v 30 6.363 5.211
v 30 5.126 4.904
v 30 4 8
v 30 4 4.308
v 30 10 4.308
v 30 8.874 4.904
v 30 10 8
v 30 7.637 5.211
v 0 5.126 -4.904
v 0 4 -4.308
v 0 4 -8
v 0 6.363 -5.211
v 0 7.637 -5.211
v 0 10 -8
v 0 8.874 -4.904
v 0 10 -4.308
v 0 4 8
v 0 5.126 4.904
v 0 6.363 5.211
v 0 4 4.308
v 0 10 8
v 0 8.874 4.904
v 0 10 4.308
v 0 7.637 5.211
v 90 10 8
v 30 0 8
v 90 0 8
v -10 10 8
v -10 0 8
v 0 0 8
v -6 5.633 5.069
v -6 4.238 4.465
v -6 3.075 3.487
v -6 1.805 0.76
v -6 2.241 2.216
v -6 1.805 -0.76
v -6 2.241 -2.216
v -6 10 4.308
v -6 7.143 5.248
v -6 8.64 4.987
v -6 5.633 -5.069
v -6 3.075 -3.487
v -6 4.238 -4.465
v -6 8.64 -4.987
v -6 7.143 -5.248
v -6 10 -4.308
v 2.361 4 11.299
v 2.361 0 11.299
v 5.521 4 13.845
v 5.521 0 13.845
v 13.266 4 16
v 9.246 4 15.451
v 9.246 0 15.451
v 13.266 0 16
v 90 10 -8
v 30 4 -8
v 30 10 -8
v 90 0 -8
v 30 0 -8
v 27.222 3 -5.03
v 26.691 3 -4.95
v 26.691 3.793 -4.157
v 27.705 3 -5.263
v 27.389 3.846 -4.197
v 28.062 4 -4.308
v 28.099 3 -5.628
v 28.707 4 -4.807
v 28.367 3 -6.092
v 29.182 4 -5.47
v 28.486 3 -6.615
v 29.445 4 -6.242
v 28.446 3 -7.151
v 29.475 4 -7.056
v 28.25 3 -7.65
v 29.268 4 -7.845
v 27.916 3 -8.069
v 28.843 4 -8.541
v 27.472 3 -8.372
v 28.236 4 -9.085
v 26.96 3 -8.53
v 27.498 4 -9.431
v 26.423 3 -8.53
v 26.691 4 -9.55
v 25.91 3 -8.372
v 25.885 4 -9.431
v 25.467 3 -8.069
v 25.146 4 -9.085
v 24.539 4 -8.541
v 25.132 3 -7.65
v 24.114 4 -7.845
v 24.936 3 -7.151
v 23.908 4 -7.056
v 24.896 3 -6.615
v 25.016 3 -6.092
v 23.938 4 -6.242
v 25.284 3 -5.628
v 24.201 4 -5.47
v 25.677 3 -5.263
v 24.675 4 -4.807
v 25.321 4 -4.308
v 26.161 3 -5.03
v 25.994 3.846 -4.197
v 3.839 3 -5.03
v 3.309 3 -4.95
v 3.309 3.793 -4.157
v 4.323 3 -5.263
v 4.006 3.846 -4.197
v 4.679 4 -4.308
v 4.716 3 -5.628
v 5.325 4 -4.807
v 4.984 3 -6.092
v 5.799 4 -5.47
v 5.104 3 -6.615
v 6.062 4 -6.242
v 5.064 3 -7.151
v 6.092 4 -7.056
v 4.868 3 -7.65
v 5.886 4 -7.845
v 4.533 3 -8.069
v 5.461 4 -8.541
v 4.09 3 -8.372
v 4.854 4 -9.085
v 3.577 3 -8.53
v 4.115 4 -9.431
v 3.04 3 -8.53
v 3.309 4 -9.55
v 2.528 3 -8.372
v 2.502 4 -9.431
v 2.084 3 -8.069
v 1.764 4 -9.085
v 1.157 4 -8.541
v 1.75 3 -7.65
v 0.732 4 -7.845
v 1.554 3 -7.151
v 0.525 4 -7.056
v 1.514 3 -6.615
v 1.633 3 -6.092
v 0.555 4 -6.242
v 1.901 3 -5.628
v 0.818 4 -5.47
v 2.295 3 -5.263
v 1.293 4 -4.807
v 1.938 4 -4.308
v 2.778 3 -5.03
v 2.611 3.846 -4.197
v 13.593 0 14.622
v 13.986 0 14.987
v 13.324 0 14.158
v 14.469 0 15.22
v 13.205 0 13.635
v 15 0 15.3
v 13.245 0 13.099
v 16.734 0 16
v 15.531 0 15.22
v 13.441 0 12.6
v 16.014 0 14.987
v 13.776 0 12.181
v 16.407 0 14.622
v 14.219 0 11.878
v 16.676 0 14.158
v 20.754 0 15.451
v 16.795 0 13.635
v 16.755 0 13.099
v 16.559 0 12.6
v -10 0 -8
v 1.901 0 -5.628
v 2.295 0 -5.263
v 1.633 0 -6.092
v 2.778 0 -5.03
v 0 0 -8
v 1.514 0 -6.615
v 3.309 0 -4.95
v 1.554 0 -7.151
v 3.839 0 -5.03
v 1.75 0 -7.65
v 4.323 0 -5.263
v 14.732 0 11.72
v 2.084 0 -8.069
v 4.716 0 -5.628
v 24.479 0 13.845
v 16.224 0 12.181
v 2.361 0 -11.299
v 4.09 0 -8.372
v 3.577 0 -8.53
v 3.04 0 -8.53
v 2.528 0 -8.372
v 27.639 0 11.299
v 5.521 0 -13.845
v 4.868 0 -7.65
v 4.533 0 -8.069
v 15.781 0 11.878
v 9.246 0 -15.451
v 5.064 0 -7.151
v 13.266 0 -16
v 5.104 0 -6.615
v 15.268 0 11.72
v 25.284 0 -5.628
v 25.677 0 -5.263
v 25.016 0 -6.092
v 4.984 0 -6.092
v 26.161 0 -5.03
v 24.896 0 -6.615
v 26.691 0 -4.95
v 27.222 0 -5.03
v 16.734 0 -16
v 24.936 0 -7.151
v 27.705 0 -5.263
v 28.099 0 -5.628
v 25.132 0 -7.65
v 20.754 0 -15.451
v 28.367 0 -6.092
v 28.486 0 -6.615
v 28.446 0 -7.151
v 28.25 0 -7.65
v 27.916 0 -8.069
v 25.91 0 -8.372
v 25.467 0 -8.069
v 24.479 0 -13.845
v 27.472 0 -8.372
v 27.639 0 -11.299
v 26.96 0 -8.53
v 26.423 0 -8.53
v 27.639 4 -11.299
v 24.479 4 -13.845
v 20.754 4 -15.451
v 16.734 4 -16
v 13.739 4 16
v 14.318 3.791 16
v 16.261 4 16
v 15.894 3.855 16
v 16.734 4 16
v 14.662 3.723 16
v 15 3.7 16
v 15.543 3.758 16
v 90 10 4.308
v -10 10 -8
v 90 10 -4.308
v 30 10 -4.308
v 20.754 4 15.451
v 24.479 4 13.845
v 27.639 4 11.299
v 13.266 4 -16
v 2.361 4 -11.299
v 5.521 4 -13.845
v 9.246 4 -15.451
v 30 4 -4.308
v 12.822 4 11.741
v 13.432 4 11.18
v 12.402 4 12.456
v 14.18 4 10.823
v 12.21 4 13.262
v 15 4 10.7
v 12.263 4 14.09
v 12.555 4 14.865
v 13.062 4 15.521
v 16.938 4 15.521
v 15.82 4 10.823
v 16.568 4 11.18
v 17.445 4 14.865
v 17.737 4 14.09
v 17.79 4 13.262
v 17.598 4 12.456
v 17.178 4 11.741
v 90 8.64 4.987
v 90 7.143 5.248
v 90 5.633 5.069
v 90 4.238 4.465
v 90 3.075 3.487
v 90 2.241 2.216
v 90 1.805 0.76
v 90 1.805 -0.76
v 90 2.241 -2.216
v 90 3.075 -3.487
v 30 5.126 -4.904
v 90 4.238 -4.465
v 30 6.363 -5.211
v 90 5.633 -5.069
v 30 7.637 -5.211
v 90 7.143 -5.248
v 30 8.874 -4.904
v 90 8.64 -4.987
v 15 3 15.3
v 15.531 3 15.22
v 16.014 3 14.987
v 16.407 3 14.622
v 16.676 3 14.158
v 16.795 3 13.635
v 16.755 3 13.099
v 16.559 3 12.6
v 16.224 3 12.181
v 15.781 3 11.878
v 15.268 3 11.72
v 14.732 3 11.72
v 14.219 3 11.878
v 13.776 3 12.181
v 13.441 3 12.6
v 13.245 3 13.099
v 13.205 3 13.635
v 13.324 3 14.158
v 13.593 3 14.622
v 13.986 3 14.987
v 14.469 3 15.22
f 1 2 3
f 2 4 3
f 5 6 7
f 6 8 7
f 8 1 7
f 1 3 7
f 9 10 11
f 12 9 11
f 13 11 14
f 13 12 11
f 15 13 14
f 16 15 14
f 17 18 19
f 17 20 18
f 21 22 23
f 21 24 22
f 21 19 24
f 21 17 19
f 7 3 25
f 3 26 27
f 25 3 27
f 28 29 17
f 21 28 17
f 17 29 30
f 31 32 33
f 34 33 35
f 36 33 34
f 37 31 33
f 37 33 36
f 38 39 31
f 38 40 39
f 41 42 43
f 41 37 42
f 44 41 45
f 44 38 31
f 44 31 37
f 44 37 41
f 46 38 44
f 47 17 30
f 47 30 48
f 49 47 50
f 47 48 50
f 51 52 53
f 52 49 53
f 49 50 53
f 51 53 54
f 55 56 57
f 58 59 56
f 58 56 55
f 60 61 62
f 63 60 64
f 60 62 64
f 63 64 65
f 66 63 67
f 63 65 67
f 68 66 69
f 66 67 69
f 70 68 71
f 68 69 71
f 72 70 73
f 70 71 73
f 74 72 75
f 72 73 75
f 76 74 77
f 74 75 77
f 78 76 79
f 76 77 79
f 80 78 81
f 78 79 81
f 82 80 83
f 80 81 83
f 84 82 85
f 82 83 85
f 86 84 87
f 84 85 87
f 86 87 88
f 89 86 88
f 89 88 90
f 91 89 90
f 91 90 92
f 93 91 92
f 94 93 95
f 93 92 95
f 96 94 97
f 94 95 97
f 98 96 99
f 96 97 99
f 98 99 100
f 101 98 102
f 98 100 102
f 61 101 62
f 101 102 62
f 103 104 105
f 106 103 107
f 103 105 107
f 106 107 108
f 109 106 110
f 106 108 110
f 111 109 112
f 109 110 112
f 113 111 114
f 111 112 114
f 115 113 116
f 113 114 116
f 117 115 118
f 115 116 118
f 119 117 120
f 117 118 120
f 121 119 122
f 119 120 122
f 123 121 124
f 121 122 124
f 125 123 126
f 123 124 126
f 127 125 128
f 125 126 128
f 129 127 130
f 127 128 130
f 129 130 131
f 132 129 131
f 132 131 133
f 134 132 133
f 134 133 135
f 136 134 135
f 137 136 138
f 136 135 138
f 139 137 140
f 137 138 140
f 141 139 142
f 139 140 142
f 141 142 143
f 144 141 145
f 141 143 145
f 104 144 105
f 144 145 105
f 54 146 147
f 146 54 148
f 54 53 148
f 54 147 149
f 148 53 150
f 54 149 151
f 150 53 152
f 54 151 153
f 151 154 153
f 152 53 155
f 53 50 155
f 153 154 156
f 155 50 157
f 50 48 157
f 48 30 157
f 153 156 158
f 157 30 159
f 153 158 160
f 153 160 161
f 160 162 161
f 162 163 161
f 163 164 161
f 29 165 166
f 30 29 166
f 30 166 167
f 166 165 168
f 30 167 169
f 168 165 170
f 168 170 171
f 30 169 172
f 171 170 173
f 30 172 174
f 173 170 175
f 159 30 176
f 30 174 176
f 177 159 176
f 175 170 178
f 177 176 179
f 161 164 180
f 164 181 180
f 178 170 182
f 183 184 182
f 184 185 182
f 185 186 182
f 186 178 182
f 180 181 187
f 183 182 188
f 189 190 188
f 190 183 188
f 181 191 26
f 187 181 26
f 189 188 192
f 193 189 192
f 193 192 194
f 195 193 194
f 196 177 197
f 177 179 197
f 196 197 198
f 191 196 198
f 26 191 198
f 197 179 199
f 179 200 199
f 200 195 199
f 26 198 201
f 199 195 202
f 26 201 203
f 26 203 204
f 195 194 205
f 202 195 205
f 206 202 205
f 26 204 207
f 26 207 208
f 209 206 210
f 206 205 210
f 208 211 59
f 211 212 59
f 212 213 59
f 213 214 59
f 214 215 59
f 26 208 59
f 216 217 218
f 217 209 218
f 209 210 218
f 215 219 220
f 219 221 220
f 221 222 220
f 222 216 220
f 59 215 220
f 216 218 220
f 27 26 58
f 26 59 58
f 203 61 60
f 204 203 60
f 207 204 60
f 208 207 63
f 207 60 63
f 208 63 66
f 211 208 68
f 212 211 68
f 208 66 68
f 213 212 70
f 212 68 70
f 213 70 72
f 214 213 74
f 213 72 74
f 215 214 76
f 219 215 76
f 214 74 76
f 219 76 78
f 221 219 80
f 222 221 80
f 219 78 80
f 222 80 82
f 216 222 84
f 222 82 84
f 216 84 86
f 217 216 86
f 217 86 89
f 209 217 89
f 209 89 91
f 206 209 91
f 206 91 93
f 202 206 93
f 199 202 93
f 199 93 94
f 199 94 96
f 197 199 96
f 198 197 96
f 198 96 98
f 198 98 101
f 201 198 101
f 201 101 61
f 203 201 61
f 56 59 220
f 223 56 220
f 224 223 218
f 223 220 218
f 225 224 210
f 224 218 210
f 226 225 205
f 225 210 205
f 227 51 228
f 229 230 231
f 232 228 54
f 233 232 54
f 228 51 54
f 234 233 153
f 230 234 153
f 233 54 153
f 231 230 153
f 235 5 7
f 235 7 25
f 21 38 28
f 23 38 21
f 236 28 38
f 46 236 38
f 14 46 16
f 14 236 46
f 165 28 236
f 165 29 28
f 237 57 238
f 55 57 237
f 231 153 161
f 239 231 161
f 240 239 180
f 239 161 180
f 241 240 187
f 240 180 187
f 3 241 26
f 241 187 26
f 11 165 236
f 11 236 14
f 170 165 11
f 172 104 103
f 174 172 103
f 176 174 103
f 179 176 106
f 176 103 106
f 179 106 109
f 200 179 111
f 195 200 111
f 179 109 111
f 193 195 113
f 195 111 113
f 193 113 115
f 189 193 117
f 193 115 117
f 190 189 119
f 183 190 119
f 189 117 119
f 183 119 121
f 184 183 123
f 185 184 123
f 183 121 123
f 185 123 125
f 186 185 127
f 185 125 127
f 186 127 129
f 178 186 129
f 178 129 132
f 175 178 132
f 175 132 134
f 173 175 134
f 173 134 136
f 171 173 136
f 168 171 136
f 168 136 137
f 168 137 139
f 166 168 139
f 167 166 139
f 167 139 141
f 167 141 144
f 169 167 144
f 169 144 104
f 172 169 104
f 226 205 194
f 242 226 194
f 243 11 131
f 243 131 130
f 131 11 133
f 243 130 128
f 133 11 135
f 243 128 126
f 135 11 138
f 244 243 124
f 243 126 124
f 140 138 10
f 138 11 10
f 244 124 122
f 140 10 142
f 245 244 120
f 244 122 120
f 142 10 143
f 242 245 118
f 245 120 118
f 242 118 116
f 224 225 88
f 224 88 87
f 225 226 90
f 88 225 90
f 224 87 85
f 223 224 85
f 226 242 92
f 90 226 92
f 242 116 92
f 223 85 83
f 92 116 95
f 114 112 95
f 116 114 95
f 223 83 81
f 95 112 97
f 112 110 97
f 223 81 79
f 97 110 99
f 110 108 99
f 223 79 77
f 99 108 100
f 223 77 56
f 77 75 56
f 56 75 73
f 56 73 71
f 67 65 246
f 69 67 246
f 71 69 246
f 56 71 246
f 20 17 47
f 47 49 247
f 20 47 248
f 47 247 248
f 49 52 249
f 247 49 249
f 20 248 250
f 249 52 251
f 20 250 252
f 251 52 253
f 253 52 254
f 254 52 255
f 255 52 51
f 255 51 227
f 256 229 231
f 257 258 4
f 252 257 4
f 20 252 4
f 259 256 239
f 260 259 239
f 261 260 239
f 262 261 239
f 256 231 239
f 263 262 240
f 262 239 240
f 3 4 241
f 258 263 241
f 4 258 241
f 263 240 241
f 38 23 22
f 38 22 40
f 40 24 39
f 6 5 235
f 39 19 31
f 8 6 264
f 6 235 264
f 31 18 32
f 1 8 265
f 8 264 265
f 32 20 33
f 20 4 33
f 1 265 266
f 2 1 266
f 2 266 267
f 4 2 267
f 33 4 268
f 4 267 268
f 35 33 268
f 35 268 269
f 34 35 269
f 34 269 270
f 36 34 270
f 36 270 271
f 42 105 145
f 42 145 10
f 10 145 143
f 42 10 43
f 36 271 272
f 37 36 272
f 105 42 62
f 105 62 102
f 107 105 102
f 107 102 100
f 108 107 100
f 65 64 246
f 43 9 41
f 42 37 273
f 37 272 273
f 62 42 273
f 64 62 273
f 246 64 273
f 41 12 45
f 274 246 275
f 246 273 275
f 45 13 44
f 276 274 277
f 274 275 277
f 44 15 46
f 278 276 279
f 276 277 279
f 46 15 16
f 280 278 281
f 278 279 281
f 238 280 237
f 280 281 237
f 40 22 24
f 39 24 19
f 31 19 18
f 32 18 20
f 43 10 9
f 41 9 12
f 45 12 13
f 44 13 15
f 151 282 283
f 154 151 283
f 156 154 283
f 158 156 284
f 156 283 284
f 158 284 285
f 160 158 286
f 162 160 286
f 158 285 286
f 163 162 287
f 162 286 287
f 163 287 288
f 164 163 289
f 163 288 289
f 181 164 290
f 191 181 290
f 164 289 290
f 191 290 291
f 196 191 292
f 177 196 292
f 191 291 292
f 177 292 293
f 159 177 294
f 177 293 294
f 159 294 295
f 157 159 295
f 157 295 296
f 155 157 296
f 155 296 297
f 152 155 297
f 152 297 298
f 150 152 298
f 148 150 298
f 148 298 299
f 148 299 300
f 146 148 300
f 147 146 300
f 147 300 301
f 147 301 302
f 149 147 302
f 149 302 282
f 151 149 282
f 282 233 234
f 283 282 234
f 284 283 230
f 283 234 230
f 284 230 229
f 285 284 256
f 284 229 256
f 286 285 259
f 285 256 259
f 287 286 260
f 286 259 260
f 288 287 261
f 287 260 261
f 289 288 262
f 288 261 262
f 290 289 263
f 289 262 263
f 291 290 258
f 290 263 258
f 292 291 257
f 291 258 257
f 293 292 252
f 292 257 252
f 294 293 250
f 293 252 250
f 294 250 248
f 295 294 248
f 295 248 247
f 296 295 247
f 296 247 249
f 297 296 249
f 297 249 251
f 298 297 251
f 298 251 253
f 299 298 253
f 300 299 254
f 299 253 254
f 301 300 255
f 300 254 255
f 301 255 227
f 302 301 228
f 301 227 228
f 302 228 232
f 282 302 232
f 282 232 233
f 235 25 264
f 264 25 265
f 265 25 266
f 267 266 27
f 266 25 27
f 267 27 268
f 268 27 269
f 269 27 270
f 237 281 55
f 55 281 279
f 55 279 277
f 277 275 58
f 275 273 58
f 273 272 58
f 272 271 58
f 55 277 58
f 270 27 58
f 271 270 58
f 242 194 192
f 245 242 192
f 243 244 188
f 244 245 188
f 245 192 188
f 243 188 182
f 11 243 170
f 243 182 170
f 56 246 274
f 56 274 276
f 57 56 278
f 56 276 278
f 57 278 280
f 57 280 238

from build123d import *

# Parameters (mm, degrees)
EXTRUDE_2_DEPTH     = 4
SKETCH_7_W          = 100
SKETCH_7_H          = 16
EXTRUDE_3_DEPTH     = 6
SKETCH_8_R          = 5.25
CUT_EXTRUDE_3_DEPTH = 96
SKETCH_9_W          = 30
SKETCH_9_H          = 6
CUT_EXTRUDE_4_DEPTH = 94.680307429
SKETCH_10_R         = 1.8
CUT_EXTRUDE_5_DEPTH = 92.607859925
FILLET_3_R          = 15
CHAMFER_1_SIZE      = 1


with BuildPart() as part:
    # Эскиз6 → Бобышка-Вытянуть2 (new body)
    with BuildSketch(Plane(origin=(0, 0, 0), x_dir=(1, 0, 0), z_dir=(0, 1, 0))):
        Polygon((0, 16), (0, 8), (-10, 8), (-10, -8), (0, -8), (0, -16), (30, -16), (30, -8), (90, -8), (90, 8), (30, 8), (30, 16), align=None)
    extrude(amount=EXTRUDE_2_DEPTH)

    # Эскиз7 → Бобышка-Вытянуть3 (add)
    with BuildSketch(Plane(origin=(0, 4, 0), x_dir=(1, 0, 0), z_dir=(0, 1, 0))):
        with Locations((40, 0)):
            Rectangle(SKETCH_7_W, SKETCH_7_H)
    extrude(amount=EXTRUDE_3_DEPTH)

    # Эскиз8 → Вырез-Вытянуть3 (cut)
    with BuildSketch(Plane(origin=(90, 0, 0), x_dir=(0, 0, -1), z_dir=(1, 0, 0))):
        with Locations((0, 7)):
            Circle(SKETCH_8_R)
    extrude(amount=-CUT_EXTRUDE_3_DEPTH, mode=Mode.SUBTRACT)

    # Эскиз9 → Вырез-Вытянуть4 (cut, through all)
    with BuildSketch(Plane.XY.offset(8)):
        with Locations((15, 7)):
            Rectangle(SKETCH_9_W, SKETCH_9_H)
    extrude(amount=-CUT_EXTRUDE_4_DEPTH, mode=Mode.SUBTRACT)

    # Эскиз10 → Вырез-Вытянуть5 (cut, through all)
    with BuildSketch(Plane(origin=(0, 4, 0), x_dir=(1, 0, 0), z_dir=(0, 1, 0))):
        with Locations(Location((15, -13.5, 0), (0, 0, 270))):
            Circle(SKETCH_10_R)
        with Locations(Location((3.308657049, 6.75, 0), (0, 0, 270))):
            Circle(SKETCH_10_R)
        with Locations(Location((26.691342951, 6.75, 0), (0, 0, 270))):
            Circle(SKETCH_10_R)
    extrude(amount=-CUT_EXTRUDE_5_DEPTH, mode=Mode.SUBTRACT)

    # Скругление3
    # the kernel refuses this fillet: 15 mm, written as the material it takes off along each edge
    with BuildSketch(Plane(origin=(30, -33.166247904, -16), x_dir=(-1, 0, 0), z_dir=(0, 1, 0))) as fillet_3_piece_1:
        with BuildLine():
            CenterArc((13.266499161, 15), FILLET_3_R, 207.818139285, 62.181860715)
            Line((0, 8), (-0.265329983, 7.86))
            ThreePointArc((-0.265329983, 7.86), (-0.3, 4), (-0.3, 0))
            Line((-0.3, 0), (0, -0.3))
            Line((0, -0.3), (13.266499161, -0.3))
            Line((13.266499161, -0.3), (13.266499161, 0))
        make_face()
    extrude(amount=70.332495807, mode=Mode.SUBTRACT)
    with BuildSketch(Plane(origin=(0, -33.166247904, -16), x_dir=(0, 0, 1), z_dir=(0, 1, 0))) as fillet_3_piece_2:
        with BuildLine():
            CenterArc((15, 13.266499161), FILLET_3_R, 180, 62.181860715)
            Line((0, 13.266499161), (-0.3, 13.266499161))
            Line((-0.3, 13.266499161), (-0.3, 0))
            Line((-0.3, 0), (0, -0.3))
            ThreePointArc((0, -0.3), (4, -0.3), (7.86, -0.265329983))
            Line((7.86, -0.265329983), (8, 0))
        make_face()
    extrude(amount=70.332495807, mode=Mode.SUBTRACT)
    with BuildSketch(Plane(origin=(30, -33.166247904, 16), x_dir=(-1, 0, 0), z_dir=(0, 1, 0))) as fillet_3_piece_3:
        with BuildLine():
            CenterArc((13.266499161, -15), FILLET_3_R, 90, 62.181860715)
            Line((0, -8), (-0.265329983, -7.86))
            ThreePointArc((-0.265329983, -7.86), (-0.3, -4), (-0.3, 0))
            Line((-0.3, 0), (0, 0.3))
            Line((0, 0.3), (13.266499161, 0.3))
            Line((13.266499161, 0.3), (13.266499161, 0))
        make_face()
    extrude(amount=70.332495807, mode=Mode.SUBTRACT)
    with BuildSketch(Plane(origin=(0, -33.166247904, 16), x_dir=(0, 0, -1), z_dir=(0, 1, 0))) as fillet_3_piece_4:
        with BuildLine():
            CenterArc((15, -13.266499161), FILLET_3_R, 117.818139285, 62.181860715)
            Line((0, -13.266499161), (-0.3, -13.266499161))
            Line((-0.3, -13.266499161), (-0.3, 0))
            Line((-0.3, 0), (0, 0.3))
            ThreePointArc((0, 0.3), (4, 0.3), (7.86, 0.265329983))
            Line((7.86, 0.265329983), (8, 0))
        make_face()
    extrude(amount=70.332495807, mode=Mode.SUBTRACT)

    # Фаска1
    # the kernel refuses this chamfer: 1 mm, written as the material it takes off along each edge
    with BuildSketch(Plane(origin=(3.308657049, 4, -6.75), x_dir=(0, 0, 1), z_dir=(-1, 0, 0))) as chamfer_1_piece_1:
        Polygon((1.8, -CHAMFER_1_SIZE), (1.8 + CHAMFER_1_SIZE, 0), (1.8, 0), align=None)
    revolve(axis=Axis((3.308657049, 4, -6.75), (0, 1, 0)), mode=Mode.SUBTRACT)
    with BuildSketch(Plane(origin=(26.691342951, 4, -6.75), x_dir=(0, 0, 1), z_dir=(-1, 0, 0))) as chamfer_1_piece_2:
        Polygon((1.8, -CHAMFER_1_SIZE), (1.8 + CHAMFER_1_SIZE, 0), (1.8, 0), align=None)
    revolve(axis=Axis((26.691342951, 4, -6.75), (0, 1, 0)), mode=Mode.SUBTRACT)
    with BuildSketch(Plane(origin=(15, 4, 13.5), x_dir=(0, 0, 1), z_dir=(-1, 0, 0))) as chamfer_1_piece_3:
        Polygon((1.8, -CHAMFER_1_SIZE), (1.8 + CHAMFER_1_SIZE, 0), (1.8, 0), align=None)
    revolve(axis=Axis((15, 4, 13.5), (0, 1, 0)), mode=Mode.SUBTRACT)


solid = part.part
